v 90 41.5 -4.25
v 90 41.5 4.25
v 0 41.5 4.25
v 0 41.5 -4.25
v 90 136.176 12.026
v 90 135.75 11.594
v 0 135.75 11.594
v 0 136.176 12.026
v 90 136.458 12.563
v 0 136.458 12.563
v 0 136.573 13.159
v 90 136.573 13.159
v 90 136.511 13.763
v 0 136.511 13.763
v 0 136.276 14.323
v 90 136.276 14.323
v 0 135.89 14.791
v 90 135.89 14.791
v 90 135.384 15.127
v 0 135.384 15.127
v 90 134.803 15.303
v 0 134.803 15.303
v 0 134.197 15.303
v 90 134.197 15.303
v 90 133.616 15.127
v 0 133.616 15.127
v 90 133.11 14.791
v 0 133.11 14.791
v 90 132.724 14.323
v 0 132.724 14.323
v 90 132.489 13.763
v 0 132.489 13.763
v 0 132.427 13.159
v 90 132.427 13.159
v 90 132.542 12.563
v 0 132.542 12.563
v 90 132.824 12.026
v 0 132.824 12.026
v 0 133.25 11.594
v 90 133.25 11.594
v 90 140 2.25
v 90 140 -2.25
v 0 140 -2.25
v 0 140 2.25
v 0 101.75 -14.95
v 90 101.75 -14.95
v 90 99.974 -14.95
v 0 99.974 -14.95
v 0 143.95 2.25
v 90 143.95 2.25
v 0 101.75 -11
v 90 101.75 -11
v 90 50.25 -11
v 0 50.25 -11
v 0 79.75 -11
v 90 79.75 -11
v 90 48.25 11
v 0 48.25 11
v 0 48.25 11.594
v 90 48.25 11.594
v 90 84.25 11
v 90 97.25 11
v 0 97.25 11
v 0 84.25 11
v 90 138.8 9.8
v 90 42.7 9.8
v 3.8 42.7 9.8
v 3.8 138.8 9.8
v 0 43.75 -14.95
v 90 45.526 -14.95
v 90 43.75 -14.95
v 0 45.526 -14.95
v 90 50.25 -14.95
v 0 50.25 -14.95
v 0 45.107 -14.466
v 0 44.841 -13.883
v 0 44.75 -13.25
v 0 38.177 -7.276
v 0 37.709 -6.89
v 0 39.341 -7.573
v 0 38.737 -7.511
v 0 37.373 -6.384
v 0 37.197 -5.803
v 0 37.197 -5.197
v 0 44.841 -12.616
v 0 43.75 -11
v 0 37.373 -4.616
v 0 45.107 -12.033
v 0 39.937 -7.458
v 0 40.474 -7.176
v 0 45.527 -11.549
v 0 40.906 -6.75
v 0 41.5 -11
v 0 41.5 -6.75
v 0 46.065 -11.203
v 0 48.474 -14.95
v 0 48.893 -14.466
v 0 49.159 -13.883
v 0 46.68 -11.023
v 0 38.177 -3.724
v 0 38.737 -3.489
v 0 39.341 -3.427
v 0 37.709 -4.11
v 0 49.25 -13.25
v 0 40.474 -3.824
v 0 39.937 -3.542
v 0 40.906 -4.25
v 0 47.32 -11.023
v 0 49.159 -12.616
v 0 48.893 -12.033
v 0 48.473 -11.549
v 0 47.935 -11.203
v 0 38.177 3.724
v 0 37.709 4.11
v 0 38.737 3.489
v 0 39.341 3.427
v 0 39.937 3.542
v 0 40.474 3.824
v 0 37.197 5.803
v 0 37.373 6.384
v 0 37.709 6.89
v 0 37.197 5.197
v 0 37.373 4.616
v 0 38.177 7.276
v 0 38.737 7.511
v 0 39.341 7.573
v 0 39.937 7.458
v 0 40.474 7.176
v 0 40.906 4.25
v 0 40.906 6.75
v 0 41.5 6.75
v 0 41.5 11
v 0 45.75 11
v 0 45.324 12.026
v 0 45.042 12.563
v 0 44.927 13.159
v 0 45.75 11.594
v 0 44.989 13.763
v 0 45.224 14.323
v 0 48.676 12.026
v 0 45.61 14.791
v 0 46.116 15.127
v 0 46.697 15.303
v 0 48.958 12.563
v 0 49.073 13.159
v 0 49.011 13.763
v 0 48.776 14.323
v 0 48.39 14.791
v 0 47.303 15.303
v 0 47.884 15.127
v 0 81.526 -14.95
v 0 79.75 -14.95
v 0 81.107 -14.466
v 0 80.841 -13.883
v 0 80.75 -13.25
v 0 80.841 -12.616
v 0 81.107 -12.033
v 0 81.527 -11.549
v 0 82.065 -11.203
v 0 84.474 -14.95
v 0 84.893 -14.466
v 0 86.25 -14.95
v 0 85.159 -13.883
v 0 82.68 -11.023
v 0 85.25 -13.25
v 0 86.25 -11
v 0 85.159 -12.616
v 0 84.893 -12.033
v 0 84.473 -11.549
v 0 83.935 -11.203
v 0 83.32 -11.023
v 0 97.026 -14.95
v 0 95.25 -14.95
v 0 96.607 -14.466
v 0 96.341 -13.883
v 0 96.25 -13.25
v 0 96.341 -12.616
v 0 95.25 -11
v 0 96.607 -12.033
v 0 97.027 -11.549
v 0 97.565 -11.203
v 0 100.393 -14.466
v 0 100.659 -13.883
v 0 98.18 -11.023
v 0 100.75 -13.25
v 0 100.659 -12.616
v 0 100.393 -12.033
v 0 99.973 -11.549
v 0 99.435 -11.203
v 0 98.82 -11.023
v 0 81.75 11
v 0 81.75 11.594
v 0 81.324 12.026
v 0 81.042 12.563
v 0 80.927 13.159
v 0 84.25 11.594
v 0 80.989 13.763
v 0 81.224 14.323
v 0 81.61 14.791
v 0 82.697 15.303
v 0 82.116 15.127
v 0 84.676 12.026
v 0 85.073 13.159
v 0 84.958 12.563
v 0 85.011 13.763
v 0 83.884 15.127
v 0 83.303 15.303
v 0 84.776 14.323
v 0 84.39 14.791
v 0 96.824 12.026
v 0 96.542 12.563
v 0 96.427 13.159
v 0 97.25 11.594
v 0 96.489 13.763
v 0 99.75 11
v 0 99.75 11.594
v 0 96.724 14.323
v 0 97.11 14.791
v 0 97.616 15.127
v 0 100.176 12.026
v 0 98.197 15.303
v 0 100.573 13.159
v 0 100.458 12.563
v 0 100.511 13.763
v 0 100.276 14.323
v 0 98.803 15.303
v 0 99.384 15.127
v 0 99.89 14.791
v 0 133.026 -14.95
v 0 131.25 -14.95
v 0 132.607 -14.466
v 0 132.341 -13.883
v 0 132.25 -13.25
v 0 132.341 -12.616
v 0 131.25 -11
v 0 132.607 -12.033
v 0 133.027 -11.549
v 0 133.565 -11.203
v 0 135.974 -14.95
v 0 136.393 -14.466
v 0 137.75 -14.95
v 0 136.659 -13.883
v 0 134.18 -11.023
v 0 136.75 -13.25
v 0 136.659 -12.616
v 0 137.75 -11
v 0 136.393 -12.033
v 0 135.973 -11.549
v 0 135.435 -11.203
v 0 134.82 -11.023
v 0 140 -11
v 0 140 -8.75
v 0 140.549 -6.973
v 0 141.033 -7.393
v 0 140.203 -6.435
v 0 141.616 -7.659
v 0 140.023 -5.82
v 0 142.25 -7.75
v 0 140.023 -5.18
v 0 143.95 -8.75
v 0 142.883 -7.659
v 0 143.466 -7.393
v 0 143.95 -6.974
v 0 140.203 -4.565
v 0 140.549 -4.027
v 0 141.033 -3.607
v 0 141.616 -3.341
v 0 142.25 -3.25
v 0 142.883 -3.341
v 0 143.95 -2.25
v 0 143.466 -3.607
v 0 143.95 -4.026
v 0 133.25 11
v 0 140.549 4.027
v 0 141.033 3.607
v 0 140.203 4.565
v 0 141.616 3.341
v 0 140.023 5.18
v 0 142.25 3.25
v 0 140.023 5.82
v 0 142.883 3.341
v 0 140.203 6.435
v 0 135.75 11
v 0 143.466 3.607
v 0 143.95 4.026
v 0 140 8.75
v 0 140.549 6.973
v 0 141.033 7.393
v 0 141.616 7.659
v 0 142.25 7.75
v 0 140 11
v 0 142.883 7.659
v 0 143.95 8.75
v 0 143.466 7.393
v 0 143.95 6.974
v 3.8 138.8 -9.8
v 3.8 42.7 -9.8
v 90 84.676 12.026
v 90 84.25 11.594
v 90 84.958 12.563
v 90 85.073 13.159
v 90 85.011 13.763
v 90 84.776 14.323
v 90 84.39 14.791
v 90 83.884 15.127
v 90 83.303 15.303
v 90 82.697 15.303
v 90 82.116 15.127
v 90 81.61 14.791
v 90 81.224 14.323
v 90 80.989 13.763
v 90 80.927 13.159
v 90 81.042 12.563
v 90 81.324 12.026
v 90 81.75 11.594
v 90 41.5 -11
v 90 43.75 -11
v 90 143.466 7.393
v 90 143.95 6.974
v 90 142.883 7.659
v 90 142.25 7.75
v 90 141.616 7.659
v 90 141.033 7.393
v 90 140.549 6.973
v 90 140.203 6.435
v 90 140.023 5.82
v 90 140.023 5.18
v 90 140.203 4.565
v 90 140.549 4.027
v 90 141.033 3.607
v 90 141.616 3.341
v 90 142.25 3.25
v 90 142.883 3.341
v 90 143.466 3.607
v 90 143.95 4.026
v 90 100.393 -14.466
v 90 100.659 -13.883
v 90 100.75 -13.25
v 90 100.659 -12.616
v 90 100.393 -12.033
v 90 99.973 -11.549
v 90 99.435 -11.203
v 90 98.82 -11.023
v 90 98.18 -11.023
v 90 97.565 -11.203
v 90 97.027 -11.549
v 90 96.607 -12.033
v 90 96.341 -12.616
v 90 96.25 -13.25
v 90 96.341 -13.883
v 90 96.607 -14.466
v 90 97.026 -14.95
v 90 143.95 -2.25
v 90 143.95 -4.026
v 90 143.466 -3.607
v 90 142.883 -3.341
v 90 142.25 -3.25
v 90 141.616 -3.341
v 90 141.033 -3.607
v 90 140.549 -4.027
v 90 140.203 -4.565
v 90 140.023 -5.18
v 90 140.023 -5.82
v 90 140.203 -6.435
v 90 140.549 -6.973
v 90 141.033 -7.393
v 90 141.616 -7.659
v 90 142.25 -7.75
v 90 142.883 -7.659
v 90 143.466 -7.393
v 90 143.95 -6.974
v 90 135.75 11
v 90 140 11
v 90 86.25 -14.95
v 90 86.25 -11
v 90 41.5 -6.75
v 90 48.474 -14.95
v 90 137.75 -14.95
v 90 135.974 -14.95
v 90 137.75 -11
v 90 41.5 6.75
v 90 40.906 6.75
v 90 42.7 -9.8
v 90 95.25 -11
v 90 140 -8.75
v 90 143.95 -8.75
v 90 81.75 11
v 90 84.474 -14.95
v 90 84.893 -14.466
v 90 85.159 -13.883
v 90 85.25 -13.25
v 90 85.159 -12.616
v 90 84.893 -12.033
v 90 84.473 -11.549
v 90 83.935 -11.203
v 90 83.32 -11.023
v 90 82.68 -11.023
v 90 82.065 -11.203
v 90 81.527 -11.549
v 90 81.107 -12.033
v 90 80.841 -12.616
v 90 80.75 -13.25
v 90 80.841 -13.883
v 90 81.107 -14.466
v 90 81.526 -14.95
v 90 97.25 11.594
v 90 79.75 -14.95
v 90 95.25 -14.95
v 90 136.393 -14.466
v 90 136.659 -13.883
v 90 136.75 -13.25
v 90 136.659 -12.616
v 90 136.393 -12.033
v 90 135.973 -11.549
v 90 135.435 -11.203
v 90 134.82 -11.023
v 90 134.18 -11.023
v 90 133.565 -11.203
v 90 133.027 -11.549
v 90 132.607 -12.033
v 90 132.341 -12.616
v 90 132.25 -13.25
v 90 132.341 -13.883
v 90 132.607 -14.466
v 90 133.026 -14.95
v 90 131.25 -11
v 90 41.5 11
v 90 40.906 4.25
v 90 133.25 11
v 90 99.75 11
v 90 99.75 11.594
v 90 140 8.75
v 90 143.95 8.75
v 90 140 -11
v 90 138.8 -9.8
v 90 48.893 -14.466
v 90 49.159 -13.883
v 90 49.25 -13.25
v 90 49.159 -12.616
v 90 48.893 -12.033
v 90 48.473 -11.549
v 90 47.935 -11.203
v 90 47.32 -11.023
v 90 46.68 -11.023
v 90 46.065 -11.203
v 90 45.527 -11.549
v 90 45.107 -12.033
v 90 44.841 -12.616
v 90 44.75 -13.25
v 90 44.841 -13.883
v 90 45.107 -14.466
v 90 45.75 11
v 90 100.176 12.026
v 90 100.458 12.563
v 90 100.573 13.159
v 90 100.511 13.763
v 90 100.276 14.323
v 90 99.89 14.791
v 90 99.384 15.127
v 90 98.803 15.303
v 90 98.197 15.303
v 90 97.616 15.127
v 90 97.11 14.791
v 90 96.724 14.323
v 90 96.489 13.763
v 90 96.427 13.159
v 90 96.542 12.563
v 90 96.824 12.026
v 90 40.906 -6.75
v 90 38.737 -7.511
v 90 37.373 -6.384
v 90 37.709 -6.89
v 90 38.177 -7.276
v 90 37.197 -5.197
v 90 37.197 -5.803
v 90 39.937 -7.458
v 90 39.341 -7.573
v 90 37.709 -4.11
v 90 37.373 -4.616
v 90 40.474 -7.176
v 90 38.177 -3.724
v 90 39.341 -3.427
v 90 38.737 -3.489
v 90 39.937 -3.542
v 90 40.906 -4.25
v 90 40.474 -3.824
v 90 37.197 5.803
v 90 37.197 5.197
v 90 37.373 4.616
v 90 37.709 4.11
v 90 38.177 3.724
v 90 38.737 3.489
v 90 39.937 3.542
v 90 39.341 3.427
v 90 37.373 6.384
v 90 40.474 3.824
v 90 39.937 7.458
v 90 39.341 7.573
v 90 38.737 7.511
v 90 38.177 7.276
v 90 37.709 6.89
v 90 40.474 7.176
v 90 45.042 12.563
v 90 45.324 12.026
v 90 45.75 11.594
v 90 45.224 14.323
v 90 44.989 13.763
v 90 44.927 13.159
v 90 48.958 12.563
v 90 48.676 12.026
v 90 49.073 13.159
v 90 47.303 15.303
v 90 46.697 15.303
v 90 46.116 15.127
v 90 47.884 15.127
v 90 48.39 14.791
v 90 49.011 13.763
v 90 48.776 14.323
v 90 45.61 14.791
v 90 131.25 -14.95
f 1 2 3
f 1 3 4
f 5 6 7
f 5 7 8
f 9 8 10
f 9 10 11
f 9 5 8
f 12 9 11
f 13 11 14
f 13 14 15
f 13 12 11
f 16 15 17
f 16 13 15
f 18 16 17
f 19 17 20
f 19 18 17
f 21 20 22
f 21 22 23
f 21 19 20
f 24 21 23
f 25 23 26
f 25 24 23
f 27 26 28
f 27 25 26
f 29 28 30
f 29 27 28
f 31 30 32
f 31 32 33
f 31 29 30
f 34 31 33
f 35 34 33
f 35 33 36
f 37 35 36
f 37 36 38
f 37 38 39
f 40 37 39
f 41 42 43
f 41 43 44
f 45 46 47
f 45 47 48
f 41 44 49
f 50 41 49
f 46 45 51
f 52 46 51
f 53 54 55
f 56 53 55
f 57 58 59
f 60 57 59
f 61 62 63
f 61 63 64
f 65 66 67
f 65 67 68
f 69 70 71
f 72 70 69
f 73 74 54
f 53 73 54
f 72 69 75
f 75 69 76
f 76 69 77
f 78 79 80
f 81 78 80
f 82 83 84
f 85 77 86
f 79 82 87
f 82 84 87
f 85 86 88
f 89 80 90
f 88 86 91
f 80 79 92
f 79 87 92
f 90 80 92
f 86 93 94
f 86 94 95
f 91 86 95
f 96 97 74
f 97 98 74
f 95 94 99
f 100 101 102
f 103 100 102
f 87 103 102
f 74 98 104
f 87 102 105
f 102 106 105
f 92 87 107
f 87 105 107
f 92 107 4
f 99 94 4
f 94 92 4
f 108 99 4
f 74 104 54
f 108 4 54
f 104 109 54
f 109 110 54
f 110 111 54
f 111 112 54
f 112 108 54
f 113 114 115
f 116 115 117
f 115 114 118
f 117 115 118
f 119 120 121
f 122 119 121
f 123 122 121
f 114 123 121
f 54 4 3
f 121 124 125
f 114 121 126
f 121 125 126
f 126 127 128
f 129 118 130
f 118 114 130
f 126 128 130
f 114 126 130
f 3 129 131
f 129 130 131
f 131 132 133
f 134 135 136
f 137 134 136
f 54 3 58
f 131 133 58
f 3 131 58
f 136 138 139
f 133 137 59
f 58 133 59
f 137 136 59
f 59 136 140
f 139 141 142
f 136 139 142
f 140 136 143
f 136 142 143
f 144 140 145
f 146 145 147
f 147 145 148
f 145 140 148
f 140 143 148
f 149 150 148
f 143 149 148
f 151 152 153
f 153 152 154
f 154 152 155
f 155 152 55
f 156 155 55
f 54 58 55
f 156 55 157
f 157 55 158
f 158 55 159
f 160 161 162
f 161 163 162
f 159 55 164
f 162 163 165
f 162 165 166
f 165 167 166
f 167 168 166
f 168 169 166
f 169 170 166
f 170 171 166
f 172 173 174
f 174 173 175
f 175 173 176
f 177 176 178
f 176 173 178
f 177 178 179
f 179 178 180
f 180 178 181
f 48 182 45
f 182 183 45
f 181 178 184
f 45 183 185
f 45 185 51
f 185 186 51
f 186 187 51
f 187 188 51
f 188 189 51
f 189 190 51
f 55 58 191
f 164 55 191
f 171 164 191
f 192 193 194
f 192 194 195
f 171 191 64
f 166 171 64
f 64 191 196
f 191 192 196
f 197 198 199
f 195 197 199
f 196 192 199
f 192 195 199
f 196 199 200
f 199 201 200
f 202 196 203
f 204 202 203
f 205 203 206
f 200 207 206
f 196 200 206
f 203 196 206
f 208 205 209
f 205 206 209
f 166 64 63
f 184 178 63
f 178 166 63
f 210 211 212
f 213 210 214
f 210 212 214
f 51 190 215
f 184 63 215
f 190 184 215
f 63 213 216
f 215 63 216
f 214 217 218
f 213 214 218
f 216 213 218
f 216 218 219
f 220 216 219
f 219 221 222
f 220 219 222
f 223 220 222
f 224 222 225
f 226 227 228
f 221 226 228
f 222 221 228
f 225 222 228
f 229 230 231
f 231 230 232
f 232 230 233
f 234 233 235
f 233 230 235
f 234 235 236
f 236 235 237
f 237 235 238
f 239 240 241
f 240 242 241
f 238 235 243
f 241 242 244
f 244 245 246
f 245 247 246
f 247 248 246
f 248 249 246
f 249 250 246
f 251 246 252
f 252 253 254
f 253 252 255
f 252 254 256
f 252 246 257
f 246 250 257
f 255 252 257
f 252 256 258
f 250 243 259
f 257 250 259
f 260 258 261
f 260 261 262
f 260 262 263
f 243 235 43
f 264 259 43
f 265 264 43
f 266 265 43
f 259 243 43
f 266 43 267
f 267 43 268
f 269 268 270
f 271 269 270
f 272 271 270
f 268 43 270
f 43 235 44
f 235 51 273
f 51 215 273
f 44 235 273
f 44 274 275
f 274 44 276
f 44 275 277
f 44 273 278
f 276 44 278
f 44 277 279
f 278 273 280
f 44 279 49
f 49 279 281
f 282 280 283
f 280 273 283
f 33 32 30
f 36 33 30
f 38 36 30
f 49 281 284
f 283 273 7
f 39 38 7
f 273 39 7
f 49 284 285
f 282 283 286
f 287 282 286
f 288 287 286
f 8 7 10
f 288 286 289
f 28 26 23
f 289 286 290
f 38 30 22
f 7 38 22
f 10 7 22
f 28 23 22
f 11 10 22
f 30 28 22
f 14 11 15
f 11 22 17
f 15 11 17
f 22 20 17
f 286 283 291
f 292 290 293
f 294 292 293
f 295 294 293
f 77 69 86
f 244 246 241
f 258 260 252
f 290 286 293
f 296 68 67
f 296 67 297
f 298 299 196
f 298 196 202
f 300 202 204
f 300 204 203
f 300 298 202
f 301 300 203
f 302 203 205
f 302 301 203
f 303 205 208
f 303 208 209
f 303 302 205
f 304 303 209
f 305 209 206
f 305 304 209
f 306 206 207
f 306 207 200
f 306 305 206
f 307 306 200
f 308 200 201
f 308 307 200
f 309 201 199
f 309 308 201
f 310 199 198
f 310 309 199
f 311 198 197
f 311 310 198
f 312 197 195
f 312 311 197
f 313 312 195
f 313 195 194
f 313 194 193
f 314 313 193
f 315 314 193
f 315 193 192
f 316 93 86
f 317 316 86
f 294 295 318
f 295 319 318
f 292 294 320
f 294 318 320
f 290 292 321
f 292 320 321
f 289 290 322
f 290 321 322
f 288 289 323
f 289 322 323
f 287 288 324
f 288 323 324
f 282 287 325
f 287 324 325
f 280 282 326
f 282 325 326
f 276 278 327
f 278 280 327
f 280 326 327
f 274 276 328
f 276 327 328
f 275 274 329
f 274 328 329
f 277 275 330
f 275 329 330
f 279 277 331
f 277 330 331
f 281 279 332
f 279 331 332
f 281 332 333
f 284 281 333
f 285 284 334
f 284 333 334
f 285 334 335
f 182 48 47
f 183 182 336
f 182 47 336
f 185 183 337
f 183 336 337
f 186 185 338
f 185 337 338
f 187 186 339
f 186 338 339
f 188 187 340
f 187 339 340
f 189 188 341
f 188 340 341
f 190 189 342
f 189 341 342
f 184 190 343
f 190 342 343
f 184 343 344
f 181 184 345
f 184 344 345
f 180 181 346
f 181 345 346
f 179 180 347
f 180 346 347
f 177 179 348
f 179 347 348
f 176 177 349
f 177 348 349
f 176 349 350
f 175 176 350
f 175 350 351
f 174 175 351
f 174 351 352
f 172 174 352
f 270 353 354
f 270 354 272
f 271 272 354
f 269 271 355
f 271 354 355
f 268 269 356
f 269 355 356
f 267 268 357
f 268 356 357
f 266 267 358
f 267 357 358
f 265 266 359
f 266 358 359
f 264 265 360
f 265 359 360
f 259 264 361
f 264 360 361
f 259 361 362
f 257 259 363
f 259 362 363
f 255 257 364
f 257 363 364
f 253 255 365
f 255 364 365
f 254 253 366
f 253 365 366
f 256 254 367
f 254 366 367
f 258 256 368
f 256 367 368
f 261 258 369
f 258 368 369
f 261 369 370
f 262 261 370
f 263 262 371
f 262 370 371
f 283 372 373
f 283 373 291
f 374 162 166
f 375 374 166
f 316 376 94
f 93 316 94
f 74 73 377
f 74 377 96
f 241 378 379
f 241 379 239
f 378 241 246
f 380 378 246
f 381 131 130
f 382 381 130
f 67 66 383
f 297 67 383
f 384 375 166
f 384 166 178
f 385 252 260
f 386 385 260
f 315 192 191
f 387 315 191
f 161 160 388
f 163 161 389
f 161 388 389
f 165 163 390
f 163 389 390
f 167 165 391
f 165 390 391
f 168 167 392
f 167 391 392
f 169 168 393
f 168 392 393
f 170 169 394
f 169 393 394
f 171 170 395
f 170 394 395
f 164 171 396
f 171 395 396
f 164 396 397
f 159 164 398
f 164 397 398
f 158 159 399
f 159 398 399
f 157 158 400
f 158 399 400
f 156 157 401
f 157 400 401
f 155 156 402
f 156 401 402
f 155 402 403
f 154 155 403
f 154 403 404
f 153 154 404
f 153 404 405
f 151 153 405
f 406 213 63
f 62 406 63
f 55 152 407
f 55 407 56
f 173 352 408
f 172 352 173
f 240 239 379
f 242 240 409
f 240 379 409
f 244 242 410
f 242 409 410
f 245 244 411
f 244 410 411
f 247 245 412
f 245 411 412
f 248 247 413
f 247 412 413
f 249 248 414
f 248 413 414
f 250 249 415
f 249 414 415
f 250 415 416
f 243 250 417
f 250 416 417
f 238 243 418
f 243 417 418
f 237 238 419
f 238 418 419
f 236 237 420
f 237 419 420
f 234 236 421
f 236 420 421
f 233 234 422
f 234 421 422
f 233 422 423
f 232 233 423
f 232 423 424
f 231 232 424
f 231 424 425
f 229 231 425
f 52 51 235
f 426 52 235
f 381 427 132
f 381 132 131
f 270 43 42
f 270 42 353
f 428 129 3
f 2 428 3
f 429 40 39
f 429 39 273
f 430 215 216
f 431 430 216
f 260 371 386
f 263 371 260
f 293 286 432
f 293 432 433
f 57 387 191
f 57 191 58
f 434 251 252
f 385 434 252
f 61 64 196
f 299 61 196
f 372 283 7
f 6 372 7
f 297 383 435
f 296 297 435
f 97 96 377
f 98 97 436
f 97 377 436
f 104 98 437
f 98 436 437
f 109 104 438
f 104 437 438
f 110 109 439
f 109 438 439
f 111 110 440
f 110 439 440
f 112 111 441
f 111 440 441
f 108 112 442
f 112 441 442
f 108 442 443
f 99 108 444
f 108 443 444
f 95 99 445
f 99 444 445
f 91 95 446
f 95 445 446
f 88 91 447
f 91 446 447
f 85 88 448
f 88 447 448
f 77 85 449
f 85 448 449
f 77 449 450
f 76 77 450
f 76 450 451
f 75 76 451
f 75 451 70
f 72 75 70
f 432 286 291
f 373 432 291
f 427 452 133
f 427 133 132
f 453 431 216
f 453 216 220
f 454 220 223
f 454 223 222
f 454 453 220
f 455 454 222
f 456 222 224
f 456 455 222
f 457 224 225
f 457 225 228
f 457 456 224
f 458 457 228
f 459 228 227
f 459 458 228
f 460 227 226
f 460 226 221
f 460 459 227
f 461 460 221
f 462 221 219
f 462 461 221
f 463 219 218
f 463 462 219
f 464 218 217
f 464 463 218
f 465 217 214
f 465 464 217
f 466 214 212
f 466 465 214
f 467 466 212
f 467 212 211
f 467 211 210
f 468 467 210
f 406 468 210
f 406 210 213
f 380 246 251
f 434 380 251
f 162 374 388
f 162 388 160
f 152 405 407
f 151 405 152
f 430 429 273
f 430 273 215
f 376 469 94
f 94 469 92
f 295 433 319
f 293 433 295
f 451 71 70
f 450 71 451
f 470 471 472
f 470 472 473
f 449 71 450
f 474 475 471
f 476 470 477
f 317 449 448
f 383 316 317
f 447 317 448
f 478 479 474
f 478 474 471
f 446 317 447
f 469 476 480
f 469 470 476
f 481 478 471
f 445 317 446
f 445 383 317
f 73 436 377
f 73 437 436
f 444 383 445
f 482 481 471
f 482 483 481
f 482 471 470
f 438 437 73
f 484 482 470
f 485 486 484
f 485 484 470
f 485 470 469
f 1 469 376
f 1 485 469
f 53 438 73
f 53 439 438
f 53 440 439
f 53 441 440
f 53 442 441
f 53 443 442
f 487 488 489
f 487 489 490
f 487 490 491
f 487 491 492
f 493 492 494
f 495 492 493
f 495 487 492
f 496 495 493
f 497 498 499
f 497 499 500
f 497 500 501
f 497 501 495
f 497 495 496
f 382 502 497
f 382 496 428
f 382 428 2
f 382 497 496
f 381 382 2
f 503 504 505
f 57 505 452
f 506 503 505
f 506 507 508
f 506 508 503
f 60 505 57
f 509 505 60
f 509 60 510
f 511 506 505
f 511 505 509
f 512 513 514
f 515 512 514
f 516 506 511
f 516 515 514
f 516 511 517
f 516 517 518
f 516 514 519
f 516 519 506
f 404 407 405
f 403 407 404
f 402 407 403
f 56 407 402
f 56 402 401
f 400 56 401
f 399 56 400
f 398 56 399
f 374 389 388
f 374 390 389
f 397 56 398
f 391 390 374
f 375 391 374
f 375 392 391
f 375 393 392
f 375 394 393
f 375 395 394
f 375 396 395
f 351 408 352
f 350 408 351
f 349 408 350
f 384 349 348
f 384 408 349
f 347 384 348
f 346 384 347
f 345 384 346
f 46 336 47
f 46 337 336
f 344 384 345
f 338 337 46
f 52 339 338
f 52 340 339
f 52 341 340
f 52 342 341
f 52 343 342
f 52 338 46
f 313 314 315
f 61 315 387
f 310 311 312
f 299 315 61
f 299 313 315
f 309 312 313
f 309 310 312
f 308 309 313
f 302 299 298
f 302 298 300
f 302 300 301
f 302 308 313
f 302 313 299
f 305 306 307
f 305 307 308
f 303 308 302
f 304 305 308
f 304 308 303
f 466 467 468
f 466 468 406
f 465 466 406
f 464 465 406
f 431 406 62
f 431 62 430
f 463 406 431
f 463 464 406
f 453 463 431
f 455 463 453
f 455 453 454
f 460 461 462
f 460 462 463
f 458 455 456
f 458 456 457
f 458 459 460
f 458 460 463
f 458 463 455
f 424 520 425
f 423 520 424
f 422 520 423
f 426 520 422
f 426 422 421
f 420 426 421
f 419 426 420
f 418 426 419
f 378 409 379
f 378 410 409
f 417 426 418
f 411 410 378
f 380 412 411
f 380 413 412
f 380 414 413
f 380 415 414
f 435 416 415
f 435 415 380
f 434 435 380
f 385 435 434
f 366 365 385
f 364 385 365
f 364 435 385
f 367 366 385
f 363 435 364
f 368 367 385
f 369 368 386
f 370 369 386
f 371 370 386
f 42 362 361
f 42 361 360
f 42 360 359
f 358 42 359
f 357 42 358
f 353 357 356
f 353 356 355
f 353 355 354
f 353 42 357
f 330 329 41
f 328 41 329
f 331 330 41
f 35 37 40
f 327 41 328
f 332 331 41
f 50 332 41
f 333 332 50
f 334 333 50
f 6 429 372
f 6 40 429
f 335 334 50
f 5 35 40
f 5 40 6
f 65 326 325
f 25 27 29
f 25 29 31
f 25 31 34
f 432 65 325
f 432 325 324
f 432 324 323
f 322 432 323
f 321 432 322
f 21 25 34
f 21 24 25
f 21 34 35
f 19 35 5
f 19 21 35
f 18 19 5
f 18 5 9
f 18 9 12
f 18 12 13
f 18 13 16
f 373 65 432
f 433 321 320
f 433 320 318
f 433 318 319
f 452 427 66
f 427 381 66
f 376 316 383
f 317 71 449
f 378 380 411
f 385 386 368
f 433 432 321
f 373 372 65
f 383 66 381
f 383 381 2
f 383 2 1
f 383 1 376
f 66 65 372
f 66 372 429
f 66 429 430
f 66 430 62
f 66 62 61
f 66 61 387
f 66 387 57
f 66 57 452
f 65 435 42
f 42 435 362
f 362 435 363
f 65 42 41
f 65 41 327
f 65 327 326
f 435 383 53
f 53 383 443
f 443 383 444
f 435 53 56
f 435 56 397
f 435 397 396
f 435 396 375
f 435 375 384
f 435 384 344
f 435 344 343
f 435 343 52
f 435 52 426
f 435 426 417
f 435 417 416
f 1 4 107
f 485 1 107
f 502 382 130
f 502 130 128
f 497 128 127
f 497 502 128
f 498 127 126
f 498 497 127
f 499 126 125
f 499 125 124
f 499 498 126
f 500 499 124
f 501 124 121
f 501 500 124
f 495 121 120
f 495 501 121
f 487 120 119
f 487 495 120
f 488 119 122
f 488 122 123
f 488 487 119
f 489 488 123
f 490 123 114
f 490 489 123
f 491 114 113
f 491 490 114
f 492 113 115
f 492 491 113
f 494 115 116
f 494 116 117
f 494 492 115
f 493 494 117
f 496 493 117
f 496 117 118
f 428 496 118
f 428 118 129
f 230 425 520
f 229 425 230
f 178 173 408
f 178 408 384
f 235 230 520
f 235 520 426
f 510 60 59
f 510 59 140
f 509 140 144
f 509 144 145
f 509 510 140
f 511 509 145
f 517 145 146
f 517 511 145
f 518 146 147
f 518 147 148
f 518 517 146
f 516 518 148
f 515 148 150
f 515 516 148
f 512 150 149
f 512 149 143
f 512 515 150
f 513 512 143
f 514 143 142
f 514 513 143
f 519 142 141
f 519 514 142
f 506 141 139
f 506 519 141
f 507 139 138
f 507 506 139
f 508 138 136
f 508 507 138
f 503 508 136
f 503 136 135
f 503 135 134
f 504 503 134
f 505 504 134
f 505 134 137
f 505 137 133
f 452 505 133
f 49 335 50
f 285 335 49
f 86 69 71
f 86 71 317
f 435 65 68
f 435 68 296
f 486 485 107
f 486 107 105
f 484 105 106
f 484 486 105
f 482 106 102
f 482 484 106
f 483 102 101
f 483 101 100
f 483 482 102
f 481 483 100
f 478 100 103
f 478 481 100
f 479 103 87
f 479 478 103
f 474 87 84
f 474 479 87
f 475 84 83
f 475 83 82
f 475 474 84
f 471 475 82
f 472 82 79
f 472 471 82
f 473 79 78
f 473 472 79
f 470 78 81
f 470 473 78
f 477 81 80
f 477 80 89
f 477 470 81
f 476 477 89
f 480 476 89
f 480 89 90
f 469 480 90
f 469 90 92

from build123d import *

# Parameters (mm, degrees)
EXTRUDE_1_DEPTH             = 90
SKETCH_2_W                  = 90
SKETCH_2_H                  = 17.75
EXTRUDE_2_DEPTH             = 8.2
SKETCH_3_W                  = 90
SKETCH_3_H                  = 102.45
EXTRUDE_3_DEPTH             = 8.2
SKETCH_4_W                  = 3.95
SKETCH_4_H                  = 2.25
CUT_EXTRUDE_1_DEPTH         = 91
SKETCH_5_W                  = 3.95
SKETCH_5_H                  = 29.5
CUT_EXTRUDE_2_DEPTH         = 91
SKETCH_6_W                  = 3.95
SKETCH_6_H                  = 9
CUT_EXTRUDE_3_DEPTH         = 91
SKETCH_7_W                  = 3.95
SKETCH_7_H                  = 29.5
CUT_EXTRUDE_4_DEPTH         = 91
SKETCH_8_W                  = 3.95
SKETCH_8_H                  = 6.2
CUT_EXTRUDE_5_DEPTH         = 91
SKETCH_9_W                  = 2.25
SKETCH_9_H                  = 3.95
CUT_EXTRUDE_6_DEPTH         = 91
SKETCH_10_W                 = 4.5
SKETCH_10_H                 = 3.95
CUT_EXTRUDE_7_DEPTH         = 91
SKETCH_11_W                 = 2.25
SKETCH_11_H                 = 3.95
CUT_EXTRUDE_8_DEPTH         = 91
SKETCH_12_W                 = 19.6
SKETCH_12_H                 = 96.1
CUT_EXTRUDE_9_DEPTH         = 86.2
HOLE_WIZARD_4_5_4_5_1_D     = 4.5
HOLE_WIZARD_4_5_4_5_1_DEPTH = 90
HOLE_WIZARD_2_5_2_5_1_D     = 2.5
HOLE_WIZARD_2_5_2_5_1_DEPTH = 90
SKETCH_20_R                 = 1.649948342
SKETCH_20_R_2               = 1.660581376
SKETCH_20_R_3               = 1.430745594
SKETCH_20_R_4               = 1.573250385
SKETCH_20_R_5               = 1.502029841
SKETCH_20_R_6               = 1.53795619
EXTRUDE_5_DEPTH             = 90


with BuildPart() as part:
    # Эскиз1 → Бобышка-Вытянуть1 (new body)
    with BuildSketch(Plane(origin=(90, 0, 0), x_dir=(0, 0, -1), z_dir=(1, 0, 0))):
        with BuildLine():
            Line((6.75, 40.906238208), (6.75, 135.75))
            Line((6.75, 135.75), (-11.593761792, 135.75))
            ThreePointArc((-11.593761792, 135.75), (-15.325, 134.5), (-11.593761793, 133.25))
            Line((-11.593761793, 133.25), (-11, 133.25))
            Line((-11, 133.25), (-11, 99.75))
            Line((-11, 99.75), (-11.593761792, 99.75))
            ThreePointArc((-11.593761792, 99.75), (-15.325, 98.5), (-11.593761792, 97.25))
            Line((-11.593761792, 97.25), (-11, 97.25))
            Line((-11, 97.25), (-11, 84.25))
            Line((-11, 84.25), (-11.593761792, 84.25))
            ThreePointArc((-11.593761792, 84.25), (-15.325, 83), (-11.593761792, 81.75))
            Line((-11.593761792, 81.75), (-11, 81.75))
            Line((-11, 81.75), (-11, 48.25))
            Line((-11, 48.25), (-11.593761792, 48.25))
            ThreePointArc((-11.593761792, 48.25), (-15.325, 47), (-11.593761792, 45.75))
            Line((-11.593761792, 45.75), (-11, 45.75))
            Line((-11, 45.75), (-11, 41.5))
            Line((-11, 41.5), (-6.75, 41.5))
            Line((-6.75, 41.5), (-6.75, 40.906238208))
            ThreePointArc((-6.75, 40.906238208), (-5.5, 37.175), (-4.25, 40.906238208))
            Line((-4.25, 40.906238208), (-4.25, 41.5))
            Line((-4.25, 41.5), (4.25, 41.5))
            Line((4.25, 41.5), (4.25, 40.906238208))
            ThreePointArc((4.25, 40.906238208), (5.5, 37.175), (6.75, 40.906238208))
        make_face()
    extrude(amount=-EXTRUDE_1_DEPTH)

    # Эскиз2 → Бобышка-Вытянуть2 (add)
    with BuildSketch(Plane(origin=(0, 135.75, 0), x_dir=(-1, 0, 0), z_dir=(0, 1, 0))):
        with Locations((-45, 2.125)):
            Rectangle(SKETCH_2_W, SKETCH_2_H)
    extrude(amount=EXTRUDE_2_DEPTH)

    # Эскиз3 → Бобышка-Вытянуть3 (add)
    with BuildSketch(Plane(origin=(0, 0, -6.75), x_dir=(-1, 0, 0), z_dir=(0, 0, -1))):
        with Locations((-45, 92.725)):
            Rectangle(SKETCH_3_W, SKETCH_3_H)
    extrude(amount=EXTRUDE_3_DEPTH)

    # Эскиз4 → Вырез-Вытянуть1 (cut, through all)
    with BuildSketch(Plane.ZY):
        with Locations((-12.975, 42.625)):
            Rectangle(SKETCH_4_W, SKETCH_4_H)
    extrude(amount=-CUT_EXTRUDE_1_DEPTH, mode=Mode.SUBTRACT)

    # Эскиз5 → Вырез-Вытянуть2 (cut, through all)
    with BuildSketch(Plane.ZY):
        with Locations((-12.975, 65)):
            Rectangle(SKETCH_5_W, SKETCH_5_H)
    extrude(amount=-CUT_EXTRUDE_2_DEPTH, mode=Mode.SUBTRACT)

    # Эскиз6 → Вырез-Вытянуть3 (cut, through all)
    with BuildSketch(Plane.ZY):
        with Locations((-12.975, 90.75)):
            Rectangle(SKETCH_6_W, SKETCH_6_H)
    extrude(amount=-CUT_EXTRUDE_3_DEPTH, mode=Mode.SUBTRACT)

    # Эскиз7 → Вырез-Вытянуть4 (cut, through all)
    with BuildSketch(Plane.ZY):
        with Locations((-12.975, 116.5)):
            Rectangle(SKETCH_7_W, SKETCH_7_H)
    extrude(amount=-CUT_EXTRUDE_4_DEPTH, mode=Mode.SUBTRACT)

    # Эскиз8 → Вырез-Вытянуть5 (cut, through all)
    with BuildSketch(Plane.ZY):
        with Locations((-12.975, 140.85)):
            Rectangle(SKETCH_8_W, SKETCH_8_H)
    extrude(amount=-CUT_EXTRUDE_5_DEPTH, mode=Mode.SUBTRACT)

    # Эскиз9 → Вырез-Вытянуть6 (cut, through all)
    with BuildSketch(Plane.ZY):
        with Locations((-9.875, 141.975)):
            Rectangle(SKETCH_9_W, SKETCH_9_H)
    extrude(amount=-CUT_EXTRUDE_6_DEPTH, mode=Mode.SUBTRACT)

    # Эскиз10 → Вырез-Вытянуть7 (cut, through all)
    with BuildSketch(Plane.ZY):
        with Locations((0, 141.975)):
            Rectangle(SKETCH_10_W, SKETCH_10_H)
    extrude(amount=-CUT_EXTRUDE_7_DEPTH, mode=Mode.SUBTRACT)

    # Эскиз11 → Вырез-Вытянуть8 (cut, through all)
    with BuildSketch(Plane.ZY):
        with Locations((9.875, 141.975)):
            Rectangle(SKETCH_11_W, SKETCH_11_H)
    extrude(amount=-CUT_EXTRUDE_8_DEPTH, mode=Mode.SUBTRACT)

    # Эскиз12 → Вырез-Вытянуть9 (cut)
    with BuildSketch(Plane(origin=(90, 0, 0), x_dir=(0, 0, -1), z_dir=(1, 0, 0))):
        with Locations((0, 90.75)):
            Rectangle(SKETCH_12_W, SKETCH_12_H)
    extrude(amount=-CUT_EXTRUDE_9_DEPTH, mode=Mode.SUBTRACT)

    # Диаметр отверстия Ø4.5 (4.5)1
    with Locations(Plane.ZY):
        with Locations((-13.25, 47), (-13.25, 83), (-13.25, 98.5), (-13.25, 134.5), (-5.5, 142.25), (5.5, 142.25)):
            Hole(HOLE_WIZARD_4_5_4_5_1_D / 2, depth=HOLE_WIZARD_4_5_4_5_1_DEPTH)

    # Диаметр отверстия Ø2.5 (2.5)1
    with Locations(Plane(origin=(90, 0, 0), x_dir=(0, 0, -1), z_dir=(1, 0, 0))):
        with Locations((-13.25, 98.5), (-13.25, 134.5), (-13.25, 47), (-13.25, 83), (5.5, 39.25), (-5.5, 39.25)):
            Hole(HOLE_WIZARD_2_5_2_5_1_D / 2, depth=HOLE_WIZARD_2_5_2_5_1_DEPTH)

    # Эскиз20 → Бобышка-Вытянуть5 (add)
    with BuildSketch(Plane(origin=(90, 0, 0), x_dir=(0, 0, -1), z_dir=(1, 0, 0))):
        with Locations((-13.25, 134.5)):
            Circle(SKETCH_20_R)
        with Locations((-13.25, 98.5)):
            Circle(SKETCH_20_R_2)
        with Locations((-13.25, 83)):
            Circle(SKETCH_20_R_3)
        with Locations((-13.25, 47)):
            Circle(SKETCH_20_R_4)
        with Locations((-5.5, 39.25)):
            Circle(SKETCH_20_R_5)
        with Locations((5.5, 39.25)):
            Circle(SKETCH_20_R_6)
    extrude(amount=-EXTRUDE_5_DEPTH)


solid = part.part
